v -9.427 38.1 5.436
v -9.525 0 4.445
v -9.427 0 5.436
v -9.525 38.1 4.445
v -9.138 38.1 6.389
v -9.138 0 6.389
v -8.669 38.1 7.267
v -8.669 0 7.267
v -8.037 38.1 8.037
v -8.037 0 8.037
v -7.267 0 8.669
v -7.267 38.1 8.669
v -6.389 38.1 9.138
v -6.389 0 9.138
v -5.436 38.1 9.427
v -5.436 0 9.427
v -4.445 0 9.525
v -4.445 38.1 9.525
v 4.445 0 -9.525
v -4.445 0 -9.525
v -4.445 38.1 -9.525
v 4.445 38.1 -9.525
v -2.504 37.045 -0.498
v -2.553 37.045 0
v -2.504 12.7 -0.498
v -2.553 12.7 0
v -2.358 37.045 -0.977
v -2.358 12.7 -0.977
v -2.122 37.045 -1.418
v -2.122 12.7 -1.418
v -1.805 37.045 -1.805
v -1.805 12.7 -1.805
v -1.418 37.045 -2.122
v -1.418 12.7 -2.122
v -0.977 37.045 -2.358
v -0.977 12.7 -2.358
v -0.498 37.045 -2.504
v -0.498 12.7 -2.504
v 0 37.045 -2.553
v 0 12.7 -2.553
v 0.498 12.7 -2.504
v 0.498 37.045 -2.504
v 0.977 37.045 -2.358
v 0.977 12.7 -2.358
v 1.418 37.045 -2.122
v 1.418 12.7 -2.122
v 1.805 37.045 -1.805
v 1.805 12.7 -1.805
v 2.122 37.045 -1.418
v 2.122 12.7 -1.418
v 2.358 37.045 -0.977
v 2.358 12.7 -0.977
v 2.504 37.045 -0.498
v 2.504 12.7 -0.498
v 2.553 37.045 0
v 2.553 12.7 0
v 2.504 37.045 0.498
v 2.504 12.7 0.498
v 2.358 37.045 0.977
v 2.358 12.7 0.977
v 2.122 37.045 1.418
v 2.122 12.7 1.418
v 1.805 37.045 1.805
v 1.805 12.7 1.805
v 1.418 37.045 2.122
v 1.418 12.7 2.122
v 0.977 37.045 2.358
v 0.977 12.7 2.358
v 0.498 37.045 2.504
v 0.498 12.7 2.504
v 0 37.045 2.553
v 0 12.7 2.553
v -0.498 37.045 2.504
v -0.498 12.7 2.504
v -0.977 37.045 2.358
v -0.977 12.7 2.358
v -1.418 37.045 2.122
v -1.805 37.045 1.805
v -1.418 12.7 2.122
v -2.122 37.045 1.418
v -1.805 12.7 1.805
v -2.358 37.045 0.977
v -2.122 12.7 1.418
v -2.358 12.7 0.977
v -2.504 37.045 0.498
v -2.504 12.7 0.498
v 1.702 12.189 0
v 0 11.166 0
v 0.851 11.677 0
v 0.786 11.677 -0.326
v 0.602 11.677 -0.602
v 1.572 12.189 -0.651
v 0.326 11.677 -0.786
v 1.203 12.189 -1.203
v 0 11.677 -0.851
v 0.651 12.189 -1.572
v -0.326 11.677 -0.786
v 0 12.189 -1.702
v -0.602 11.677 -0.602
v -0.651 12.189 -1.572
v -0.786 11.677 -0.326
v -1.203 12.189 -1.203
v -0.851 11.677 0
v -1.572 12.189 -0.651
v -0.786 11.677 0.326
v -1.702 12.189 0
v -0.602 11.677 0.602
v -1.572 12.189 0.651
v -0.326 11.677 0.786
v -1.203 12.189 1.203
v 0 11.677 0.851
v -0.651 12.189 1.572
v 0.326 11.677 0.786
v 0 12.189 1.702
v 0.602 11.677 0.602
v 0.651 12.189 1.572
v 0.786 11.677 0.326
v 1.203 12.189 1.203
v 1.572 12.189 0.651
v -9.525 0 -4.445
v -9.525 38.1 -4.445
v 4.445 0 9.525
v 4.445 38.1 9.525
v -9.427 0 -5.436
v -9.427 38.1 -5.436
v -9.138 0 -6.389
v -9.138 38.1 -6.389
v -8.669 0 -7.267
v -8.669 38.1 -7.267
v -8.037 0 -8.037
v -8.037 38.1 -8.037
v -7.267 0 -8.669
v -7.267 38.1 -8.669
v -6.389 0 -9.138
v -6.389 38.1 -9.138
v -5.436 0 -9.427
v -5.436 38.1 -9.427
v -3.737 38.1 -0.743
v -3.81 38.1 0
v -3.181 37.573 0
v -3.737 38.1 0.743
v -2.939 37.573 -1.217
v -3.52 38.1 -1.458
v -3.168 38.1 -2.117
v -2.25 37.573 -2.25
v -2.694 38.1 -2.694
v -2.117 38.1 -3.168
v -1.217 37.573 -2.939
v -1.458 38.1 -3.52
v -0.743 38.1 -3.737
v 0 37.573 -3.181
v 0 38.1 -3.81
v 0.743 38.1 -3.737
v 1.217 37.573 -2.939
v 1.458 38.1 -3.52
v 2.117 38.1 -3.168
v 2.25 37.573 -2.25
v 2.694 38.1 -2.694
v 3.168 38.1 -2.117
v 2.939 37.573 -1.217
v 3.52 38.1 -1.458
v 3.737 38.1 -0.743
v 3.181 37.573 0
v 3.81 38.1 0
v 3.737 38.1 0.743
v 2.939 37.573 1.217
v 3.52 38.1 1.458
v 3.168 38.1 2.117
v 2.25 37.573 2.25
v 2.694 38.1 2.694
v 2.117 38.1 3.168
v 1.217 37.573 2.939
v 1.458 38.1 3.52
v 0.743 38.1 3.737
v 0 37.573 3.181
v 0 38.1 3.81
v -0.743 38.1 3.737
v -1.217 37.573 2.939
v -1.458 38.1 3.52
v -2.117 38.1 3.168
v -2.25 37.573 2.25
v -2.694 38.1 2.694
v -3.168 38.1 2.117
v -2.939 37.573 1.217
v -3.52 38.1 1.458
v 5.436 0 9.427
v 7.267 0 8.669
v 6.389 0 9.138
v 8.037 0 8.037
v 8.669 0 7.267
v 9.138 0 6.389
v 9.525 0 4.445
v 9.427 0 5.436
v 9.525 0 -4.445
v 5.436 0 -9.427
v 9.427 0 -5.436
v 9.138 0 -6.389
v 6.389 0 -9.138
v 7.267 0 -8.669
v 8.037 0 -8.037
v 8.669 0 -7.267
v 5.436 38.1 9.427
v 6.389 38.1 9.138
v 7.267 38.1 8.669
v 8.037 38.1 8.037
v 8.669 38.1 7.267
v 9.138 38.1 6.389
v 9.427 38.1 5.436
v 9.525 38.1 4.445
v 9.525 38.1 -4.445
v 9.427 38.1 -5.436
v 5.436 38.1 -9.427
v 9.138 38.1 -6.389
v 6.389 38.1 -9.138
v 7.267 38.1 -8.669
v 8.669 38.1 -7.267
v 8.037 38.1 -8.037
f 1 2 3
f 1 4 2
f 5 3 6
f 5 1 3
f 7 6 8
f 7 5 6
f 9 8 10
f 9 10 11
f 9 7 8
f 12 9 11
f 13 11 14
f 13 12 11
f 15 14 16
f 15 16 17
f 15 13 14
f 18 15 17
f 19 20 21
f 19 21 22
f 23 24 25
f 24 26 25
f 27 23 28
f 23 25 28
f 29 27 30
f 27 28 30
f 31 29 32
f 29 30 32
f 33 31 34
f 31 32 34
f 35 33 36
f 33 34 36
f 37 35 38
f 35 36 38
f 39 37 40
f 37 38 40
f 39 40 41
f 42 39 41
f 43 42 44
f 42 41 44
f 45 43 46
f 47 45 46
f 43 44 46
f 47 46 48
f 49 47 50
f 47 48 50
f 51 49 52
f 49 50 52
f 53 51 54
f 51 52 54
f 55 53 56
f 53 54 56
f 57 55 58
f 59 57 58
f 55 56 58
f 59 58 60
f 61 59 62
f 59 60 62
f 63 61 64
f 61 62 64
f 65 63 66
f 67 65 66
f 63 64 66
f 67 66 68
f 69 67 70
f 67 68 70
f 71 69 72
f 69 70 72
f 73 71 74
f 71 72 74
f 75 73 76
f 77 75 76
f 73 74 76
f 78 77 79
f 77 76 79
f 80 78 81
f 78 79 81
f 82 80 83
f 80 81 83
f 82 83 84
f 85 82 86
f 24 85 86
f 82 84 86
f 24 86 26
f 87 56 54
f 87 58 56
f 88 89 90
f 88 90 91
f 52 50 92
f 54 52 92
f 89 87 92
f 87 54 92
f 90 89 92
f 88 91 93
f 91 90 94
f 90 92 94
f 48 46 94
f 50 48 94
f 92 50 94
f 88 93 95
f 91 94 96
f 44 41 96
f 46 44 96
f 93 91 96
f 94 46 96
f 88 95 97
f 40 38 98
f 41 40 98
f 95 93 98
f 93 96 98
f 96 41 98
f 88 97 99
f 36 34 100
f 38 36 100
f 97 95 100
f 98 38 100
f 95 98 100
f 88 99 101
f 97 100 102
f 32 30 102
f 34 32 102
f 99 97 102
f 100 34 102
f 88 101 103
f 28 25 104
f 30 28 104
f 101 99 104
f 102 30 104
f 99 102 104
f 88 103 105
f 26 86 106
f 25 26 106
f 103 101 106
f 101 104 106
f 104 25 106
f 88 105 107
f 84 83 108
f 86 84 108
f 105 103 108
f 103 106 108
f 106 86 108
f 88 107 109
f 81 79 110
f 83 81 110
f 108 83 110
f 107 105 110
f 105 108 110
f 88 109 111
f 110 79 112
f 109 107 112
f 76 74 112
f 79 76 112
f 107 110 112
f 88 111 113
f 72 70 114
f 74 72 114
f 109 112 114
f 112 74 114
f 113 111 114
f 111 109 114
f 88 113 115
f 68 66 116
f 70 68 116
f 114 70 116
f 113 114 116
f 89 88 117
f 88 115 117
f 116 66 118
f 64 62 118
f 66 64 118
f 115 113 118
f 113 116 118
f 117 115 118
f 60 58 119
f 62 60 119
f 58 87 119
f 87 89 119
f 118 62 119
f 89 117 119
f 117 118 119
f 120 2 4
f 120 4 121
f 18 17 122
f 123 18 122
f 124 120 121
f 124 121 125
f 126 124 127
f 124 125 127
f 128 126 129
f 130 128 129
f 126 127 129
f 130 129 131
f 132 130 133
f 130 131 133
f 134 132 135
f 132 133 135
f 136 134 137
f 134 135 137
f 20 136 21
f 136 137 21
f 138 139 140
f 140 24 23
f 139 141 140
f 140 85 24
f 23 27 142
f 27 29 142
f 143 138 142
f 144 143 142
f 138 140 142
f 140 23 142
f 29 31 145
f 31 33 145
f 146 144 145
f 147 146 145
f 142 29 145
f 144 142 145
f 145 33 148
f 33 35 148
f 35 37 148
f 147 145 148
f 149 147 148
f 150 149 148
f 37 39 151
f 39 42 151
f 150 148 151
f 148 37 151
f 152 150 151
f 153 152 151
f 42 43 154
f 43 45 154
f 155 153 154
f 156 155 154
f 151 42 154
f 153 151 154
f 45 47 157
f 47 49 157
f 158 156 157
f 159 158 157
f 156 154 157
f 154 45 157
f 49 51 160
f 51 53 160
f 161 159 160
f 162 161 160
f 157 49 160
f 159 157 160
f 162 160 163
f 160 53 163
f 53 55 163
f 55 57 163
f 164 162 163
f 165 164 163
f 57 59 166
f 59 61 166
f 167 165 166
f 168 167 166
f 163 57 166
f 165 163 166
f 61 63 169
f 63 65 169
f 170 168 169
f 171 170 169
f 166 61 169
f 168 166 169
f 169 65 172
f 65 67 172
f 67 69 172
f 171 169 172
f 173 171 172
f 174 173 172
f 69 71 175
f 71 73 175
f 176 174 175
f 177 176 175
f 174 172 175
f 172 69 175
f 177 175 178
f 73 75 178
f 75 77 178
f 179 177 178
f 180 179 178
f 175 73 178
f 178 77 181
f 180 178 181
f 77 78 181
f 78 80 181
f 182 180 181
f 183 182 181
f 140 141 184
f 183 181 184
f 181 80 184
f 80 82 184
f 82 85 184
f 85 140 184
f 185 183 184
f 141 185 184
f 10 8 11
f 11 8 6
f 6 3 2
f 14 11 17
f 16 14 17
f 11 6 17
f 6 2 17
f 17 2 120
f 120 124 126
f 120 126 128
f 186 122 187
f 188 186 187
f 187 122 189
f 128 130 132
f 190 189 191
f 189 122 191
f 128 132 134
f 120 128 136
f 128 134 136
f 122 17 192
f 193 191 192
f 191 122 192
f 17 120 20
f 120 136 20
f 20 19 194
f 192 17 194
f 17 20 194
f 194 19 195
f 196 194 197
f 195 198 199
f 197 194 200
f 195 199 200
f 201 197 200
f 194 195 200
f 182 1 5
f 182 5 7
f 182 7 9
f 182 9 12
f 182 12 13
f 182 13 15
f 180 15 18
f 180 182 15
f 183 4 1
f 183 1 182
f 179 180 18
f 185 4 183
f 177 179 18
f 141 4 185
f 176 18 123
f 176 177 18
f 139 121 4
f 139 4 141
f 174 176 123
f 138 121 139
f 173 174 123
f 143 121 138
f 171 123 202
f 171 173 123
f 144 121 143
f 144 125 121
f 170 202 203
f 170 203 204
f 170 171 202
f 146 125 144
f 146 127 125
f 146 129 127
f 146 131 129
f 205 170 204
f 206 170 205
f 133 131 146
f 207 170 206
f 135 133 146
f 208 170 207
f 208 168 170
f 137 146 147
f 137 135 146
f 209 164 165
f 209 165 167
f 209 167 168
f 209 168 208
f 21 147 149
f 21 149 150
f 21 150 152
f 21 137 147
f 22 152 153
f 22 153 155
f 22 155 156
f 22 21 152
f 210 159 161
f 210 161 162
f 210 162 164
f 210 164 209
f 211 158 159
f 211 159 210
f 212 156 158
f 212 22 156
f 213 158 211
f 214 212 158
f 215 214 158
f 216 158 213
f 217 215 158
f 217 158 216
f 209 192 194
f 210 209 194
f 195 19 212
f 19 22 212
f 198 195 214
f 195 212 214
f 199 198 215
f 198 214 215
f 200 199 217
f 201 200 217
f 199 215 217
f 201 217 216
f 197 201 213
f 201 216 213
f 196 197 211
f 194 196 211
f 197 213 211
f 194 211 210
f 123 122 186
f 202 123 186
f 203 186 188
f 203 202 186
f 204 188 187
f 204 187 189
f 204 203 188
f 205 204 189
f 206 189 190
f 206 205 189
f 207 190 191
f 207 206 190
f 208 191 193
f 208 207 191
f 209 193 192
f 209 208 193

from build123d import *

# Parameters (mm, degrees)
SKETCH1_W                         = 19.05
SKETCH1_H                         = 19.05
BOSS_EXTRUDE1_DEPTH               = 38.1
F_1_4_20_TAPPED_HOLE1_D           = 5.1054
F_1_4_20_TAPPED_HOLE1_DEPTH       = 25.4
F_1_4_20_TAPPED_HOLE1_CSINK_D     = 7.62
F_1_4_20_TAPPED_HOLE1_CSINK_ANGLE = 100
F_1_4_20_TAPPED_HOLE1_TIP         = 1.533816902
FILLET1_R                         = 5.08


with BuildPart() as part:
    # Sketch1 → Boss-Extrude1 (new body)
    with BuildSketch(Plane(origin=(0, 0, 0), x_dir=(1, 0, 0), z_dir=(0, 1, 0))):
        Rectangle(SKETCH1_W, SKETCH1_H)
    extrude(amount=BOSS_EXTRUDE1_DEPTH)

    # 1/4-20 Tapped Hole1
    with Locations(Plane(origin=(0, 38.1, 0), x_dir=(1, 0, 0), z_dir=(0, 1, 0))):
        with Locations((0, 0)):
            CounterSinkHole(F_1_4_20_TAPPED_HOLE1_D / 2, F_1_4_20_TAPPED_HOLE1_CSINK_D / 2, depth=F_1_4_20_TAPPED_HOLE1_DEPTH, counter_sink_angle=F_1_4_20_TAPPED_HOLE1_CSINK_ANGLE)
            with Locations((0, 0, -(F_1_4_20_TAPPED_HOLE1_DEPTH + F_1_4_20_TAPPED_HOLE1_TIP / 2))):  # 118° drill point
                Cone(0, F_1_4_20_TAPPED_HOLE1_D / 2, F_1_4_20_TAPPED_HOLE1_TIP, mode=Mode.SUBTRACT)

    # Fillet1
    fillet1_edges = [part.edges().sort_by_distance(p)[0] for p in [
        (9.525, 19.05, 9.525),
        (-9.525, 19.05, 9.525),
        (-9.525, 19.05, -9.525),
        (9.525, 19.05, -9.525),
    ]]
    fillet(fillet1_edges, radius=FILLET1_R)


solid = part.part
